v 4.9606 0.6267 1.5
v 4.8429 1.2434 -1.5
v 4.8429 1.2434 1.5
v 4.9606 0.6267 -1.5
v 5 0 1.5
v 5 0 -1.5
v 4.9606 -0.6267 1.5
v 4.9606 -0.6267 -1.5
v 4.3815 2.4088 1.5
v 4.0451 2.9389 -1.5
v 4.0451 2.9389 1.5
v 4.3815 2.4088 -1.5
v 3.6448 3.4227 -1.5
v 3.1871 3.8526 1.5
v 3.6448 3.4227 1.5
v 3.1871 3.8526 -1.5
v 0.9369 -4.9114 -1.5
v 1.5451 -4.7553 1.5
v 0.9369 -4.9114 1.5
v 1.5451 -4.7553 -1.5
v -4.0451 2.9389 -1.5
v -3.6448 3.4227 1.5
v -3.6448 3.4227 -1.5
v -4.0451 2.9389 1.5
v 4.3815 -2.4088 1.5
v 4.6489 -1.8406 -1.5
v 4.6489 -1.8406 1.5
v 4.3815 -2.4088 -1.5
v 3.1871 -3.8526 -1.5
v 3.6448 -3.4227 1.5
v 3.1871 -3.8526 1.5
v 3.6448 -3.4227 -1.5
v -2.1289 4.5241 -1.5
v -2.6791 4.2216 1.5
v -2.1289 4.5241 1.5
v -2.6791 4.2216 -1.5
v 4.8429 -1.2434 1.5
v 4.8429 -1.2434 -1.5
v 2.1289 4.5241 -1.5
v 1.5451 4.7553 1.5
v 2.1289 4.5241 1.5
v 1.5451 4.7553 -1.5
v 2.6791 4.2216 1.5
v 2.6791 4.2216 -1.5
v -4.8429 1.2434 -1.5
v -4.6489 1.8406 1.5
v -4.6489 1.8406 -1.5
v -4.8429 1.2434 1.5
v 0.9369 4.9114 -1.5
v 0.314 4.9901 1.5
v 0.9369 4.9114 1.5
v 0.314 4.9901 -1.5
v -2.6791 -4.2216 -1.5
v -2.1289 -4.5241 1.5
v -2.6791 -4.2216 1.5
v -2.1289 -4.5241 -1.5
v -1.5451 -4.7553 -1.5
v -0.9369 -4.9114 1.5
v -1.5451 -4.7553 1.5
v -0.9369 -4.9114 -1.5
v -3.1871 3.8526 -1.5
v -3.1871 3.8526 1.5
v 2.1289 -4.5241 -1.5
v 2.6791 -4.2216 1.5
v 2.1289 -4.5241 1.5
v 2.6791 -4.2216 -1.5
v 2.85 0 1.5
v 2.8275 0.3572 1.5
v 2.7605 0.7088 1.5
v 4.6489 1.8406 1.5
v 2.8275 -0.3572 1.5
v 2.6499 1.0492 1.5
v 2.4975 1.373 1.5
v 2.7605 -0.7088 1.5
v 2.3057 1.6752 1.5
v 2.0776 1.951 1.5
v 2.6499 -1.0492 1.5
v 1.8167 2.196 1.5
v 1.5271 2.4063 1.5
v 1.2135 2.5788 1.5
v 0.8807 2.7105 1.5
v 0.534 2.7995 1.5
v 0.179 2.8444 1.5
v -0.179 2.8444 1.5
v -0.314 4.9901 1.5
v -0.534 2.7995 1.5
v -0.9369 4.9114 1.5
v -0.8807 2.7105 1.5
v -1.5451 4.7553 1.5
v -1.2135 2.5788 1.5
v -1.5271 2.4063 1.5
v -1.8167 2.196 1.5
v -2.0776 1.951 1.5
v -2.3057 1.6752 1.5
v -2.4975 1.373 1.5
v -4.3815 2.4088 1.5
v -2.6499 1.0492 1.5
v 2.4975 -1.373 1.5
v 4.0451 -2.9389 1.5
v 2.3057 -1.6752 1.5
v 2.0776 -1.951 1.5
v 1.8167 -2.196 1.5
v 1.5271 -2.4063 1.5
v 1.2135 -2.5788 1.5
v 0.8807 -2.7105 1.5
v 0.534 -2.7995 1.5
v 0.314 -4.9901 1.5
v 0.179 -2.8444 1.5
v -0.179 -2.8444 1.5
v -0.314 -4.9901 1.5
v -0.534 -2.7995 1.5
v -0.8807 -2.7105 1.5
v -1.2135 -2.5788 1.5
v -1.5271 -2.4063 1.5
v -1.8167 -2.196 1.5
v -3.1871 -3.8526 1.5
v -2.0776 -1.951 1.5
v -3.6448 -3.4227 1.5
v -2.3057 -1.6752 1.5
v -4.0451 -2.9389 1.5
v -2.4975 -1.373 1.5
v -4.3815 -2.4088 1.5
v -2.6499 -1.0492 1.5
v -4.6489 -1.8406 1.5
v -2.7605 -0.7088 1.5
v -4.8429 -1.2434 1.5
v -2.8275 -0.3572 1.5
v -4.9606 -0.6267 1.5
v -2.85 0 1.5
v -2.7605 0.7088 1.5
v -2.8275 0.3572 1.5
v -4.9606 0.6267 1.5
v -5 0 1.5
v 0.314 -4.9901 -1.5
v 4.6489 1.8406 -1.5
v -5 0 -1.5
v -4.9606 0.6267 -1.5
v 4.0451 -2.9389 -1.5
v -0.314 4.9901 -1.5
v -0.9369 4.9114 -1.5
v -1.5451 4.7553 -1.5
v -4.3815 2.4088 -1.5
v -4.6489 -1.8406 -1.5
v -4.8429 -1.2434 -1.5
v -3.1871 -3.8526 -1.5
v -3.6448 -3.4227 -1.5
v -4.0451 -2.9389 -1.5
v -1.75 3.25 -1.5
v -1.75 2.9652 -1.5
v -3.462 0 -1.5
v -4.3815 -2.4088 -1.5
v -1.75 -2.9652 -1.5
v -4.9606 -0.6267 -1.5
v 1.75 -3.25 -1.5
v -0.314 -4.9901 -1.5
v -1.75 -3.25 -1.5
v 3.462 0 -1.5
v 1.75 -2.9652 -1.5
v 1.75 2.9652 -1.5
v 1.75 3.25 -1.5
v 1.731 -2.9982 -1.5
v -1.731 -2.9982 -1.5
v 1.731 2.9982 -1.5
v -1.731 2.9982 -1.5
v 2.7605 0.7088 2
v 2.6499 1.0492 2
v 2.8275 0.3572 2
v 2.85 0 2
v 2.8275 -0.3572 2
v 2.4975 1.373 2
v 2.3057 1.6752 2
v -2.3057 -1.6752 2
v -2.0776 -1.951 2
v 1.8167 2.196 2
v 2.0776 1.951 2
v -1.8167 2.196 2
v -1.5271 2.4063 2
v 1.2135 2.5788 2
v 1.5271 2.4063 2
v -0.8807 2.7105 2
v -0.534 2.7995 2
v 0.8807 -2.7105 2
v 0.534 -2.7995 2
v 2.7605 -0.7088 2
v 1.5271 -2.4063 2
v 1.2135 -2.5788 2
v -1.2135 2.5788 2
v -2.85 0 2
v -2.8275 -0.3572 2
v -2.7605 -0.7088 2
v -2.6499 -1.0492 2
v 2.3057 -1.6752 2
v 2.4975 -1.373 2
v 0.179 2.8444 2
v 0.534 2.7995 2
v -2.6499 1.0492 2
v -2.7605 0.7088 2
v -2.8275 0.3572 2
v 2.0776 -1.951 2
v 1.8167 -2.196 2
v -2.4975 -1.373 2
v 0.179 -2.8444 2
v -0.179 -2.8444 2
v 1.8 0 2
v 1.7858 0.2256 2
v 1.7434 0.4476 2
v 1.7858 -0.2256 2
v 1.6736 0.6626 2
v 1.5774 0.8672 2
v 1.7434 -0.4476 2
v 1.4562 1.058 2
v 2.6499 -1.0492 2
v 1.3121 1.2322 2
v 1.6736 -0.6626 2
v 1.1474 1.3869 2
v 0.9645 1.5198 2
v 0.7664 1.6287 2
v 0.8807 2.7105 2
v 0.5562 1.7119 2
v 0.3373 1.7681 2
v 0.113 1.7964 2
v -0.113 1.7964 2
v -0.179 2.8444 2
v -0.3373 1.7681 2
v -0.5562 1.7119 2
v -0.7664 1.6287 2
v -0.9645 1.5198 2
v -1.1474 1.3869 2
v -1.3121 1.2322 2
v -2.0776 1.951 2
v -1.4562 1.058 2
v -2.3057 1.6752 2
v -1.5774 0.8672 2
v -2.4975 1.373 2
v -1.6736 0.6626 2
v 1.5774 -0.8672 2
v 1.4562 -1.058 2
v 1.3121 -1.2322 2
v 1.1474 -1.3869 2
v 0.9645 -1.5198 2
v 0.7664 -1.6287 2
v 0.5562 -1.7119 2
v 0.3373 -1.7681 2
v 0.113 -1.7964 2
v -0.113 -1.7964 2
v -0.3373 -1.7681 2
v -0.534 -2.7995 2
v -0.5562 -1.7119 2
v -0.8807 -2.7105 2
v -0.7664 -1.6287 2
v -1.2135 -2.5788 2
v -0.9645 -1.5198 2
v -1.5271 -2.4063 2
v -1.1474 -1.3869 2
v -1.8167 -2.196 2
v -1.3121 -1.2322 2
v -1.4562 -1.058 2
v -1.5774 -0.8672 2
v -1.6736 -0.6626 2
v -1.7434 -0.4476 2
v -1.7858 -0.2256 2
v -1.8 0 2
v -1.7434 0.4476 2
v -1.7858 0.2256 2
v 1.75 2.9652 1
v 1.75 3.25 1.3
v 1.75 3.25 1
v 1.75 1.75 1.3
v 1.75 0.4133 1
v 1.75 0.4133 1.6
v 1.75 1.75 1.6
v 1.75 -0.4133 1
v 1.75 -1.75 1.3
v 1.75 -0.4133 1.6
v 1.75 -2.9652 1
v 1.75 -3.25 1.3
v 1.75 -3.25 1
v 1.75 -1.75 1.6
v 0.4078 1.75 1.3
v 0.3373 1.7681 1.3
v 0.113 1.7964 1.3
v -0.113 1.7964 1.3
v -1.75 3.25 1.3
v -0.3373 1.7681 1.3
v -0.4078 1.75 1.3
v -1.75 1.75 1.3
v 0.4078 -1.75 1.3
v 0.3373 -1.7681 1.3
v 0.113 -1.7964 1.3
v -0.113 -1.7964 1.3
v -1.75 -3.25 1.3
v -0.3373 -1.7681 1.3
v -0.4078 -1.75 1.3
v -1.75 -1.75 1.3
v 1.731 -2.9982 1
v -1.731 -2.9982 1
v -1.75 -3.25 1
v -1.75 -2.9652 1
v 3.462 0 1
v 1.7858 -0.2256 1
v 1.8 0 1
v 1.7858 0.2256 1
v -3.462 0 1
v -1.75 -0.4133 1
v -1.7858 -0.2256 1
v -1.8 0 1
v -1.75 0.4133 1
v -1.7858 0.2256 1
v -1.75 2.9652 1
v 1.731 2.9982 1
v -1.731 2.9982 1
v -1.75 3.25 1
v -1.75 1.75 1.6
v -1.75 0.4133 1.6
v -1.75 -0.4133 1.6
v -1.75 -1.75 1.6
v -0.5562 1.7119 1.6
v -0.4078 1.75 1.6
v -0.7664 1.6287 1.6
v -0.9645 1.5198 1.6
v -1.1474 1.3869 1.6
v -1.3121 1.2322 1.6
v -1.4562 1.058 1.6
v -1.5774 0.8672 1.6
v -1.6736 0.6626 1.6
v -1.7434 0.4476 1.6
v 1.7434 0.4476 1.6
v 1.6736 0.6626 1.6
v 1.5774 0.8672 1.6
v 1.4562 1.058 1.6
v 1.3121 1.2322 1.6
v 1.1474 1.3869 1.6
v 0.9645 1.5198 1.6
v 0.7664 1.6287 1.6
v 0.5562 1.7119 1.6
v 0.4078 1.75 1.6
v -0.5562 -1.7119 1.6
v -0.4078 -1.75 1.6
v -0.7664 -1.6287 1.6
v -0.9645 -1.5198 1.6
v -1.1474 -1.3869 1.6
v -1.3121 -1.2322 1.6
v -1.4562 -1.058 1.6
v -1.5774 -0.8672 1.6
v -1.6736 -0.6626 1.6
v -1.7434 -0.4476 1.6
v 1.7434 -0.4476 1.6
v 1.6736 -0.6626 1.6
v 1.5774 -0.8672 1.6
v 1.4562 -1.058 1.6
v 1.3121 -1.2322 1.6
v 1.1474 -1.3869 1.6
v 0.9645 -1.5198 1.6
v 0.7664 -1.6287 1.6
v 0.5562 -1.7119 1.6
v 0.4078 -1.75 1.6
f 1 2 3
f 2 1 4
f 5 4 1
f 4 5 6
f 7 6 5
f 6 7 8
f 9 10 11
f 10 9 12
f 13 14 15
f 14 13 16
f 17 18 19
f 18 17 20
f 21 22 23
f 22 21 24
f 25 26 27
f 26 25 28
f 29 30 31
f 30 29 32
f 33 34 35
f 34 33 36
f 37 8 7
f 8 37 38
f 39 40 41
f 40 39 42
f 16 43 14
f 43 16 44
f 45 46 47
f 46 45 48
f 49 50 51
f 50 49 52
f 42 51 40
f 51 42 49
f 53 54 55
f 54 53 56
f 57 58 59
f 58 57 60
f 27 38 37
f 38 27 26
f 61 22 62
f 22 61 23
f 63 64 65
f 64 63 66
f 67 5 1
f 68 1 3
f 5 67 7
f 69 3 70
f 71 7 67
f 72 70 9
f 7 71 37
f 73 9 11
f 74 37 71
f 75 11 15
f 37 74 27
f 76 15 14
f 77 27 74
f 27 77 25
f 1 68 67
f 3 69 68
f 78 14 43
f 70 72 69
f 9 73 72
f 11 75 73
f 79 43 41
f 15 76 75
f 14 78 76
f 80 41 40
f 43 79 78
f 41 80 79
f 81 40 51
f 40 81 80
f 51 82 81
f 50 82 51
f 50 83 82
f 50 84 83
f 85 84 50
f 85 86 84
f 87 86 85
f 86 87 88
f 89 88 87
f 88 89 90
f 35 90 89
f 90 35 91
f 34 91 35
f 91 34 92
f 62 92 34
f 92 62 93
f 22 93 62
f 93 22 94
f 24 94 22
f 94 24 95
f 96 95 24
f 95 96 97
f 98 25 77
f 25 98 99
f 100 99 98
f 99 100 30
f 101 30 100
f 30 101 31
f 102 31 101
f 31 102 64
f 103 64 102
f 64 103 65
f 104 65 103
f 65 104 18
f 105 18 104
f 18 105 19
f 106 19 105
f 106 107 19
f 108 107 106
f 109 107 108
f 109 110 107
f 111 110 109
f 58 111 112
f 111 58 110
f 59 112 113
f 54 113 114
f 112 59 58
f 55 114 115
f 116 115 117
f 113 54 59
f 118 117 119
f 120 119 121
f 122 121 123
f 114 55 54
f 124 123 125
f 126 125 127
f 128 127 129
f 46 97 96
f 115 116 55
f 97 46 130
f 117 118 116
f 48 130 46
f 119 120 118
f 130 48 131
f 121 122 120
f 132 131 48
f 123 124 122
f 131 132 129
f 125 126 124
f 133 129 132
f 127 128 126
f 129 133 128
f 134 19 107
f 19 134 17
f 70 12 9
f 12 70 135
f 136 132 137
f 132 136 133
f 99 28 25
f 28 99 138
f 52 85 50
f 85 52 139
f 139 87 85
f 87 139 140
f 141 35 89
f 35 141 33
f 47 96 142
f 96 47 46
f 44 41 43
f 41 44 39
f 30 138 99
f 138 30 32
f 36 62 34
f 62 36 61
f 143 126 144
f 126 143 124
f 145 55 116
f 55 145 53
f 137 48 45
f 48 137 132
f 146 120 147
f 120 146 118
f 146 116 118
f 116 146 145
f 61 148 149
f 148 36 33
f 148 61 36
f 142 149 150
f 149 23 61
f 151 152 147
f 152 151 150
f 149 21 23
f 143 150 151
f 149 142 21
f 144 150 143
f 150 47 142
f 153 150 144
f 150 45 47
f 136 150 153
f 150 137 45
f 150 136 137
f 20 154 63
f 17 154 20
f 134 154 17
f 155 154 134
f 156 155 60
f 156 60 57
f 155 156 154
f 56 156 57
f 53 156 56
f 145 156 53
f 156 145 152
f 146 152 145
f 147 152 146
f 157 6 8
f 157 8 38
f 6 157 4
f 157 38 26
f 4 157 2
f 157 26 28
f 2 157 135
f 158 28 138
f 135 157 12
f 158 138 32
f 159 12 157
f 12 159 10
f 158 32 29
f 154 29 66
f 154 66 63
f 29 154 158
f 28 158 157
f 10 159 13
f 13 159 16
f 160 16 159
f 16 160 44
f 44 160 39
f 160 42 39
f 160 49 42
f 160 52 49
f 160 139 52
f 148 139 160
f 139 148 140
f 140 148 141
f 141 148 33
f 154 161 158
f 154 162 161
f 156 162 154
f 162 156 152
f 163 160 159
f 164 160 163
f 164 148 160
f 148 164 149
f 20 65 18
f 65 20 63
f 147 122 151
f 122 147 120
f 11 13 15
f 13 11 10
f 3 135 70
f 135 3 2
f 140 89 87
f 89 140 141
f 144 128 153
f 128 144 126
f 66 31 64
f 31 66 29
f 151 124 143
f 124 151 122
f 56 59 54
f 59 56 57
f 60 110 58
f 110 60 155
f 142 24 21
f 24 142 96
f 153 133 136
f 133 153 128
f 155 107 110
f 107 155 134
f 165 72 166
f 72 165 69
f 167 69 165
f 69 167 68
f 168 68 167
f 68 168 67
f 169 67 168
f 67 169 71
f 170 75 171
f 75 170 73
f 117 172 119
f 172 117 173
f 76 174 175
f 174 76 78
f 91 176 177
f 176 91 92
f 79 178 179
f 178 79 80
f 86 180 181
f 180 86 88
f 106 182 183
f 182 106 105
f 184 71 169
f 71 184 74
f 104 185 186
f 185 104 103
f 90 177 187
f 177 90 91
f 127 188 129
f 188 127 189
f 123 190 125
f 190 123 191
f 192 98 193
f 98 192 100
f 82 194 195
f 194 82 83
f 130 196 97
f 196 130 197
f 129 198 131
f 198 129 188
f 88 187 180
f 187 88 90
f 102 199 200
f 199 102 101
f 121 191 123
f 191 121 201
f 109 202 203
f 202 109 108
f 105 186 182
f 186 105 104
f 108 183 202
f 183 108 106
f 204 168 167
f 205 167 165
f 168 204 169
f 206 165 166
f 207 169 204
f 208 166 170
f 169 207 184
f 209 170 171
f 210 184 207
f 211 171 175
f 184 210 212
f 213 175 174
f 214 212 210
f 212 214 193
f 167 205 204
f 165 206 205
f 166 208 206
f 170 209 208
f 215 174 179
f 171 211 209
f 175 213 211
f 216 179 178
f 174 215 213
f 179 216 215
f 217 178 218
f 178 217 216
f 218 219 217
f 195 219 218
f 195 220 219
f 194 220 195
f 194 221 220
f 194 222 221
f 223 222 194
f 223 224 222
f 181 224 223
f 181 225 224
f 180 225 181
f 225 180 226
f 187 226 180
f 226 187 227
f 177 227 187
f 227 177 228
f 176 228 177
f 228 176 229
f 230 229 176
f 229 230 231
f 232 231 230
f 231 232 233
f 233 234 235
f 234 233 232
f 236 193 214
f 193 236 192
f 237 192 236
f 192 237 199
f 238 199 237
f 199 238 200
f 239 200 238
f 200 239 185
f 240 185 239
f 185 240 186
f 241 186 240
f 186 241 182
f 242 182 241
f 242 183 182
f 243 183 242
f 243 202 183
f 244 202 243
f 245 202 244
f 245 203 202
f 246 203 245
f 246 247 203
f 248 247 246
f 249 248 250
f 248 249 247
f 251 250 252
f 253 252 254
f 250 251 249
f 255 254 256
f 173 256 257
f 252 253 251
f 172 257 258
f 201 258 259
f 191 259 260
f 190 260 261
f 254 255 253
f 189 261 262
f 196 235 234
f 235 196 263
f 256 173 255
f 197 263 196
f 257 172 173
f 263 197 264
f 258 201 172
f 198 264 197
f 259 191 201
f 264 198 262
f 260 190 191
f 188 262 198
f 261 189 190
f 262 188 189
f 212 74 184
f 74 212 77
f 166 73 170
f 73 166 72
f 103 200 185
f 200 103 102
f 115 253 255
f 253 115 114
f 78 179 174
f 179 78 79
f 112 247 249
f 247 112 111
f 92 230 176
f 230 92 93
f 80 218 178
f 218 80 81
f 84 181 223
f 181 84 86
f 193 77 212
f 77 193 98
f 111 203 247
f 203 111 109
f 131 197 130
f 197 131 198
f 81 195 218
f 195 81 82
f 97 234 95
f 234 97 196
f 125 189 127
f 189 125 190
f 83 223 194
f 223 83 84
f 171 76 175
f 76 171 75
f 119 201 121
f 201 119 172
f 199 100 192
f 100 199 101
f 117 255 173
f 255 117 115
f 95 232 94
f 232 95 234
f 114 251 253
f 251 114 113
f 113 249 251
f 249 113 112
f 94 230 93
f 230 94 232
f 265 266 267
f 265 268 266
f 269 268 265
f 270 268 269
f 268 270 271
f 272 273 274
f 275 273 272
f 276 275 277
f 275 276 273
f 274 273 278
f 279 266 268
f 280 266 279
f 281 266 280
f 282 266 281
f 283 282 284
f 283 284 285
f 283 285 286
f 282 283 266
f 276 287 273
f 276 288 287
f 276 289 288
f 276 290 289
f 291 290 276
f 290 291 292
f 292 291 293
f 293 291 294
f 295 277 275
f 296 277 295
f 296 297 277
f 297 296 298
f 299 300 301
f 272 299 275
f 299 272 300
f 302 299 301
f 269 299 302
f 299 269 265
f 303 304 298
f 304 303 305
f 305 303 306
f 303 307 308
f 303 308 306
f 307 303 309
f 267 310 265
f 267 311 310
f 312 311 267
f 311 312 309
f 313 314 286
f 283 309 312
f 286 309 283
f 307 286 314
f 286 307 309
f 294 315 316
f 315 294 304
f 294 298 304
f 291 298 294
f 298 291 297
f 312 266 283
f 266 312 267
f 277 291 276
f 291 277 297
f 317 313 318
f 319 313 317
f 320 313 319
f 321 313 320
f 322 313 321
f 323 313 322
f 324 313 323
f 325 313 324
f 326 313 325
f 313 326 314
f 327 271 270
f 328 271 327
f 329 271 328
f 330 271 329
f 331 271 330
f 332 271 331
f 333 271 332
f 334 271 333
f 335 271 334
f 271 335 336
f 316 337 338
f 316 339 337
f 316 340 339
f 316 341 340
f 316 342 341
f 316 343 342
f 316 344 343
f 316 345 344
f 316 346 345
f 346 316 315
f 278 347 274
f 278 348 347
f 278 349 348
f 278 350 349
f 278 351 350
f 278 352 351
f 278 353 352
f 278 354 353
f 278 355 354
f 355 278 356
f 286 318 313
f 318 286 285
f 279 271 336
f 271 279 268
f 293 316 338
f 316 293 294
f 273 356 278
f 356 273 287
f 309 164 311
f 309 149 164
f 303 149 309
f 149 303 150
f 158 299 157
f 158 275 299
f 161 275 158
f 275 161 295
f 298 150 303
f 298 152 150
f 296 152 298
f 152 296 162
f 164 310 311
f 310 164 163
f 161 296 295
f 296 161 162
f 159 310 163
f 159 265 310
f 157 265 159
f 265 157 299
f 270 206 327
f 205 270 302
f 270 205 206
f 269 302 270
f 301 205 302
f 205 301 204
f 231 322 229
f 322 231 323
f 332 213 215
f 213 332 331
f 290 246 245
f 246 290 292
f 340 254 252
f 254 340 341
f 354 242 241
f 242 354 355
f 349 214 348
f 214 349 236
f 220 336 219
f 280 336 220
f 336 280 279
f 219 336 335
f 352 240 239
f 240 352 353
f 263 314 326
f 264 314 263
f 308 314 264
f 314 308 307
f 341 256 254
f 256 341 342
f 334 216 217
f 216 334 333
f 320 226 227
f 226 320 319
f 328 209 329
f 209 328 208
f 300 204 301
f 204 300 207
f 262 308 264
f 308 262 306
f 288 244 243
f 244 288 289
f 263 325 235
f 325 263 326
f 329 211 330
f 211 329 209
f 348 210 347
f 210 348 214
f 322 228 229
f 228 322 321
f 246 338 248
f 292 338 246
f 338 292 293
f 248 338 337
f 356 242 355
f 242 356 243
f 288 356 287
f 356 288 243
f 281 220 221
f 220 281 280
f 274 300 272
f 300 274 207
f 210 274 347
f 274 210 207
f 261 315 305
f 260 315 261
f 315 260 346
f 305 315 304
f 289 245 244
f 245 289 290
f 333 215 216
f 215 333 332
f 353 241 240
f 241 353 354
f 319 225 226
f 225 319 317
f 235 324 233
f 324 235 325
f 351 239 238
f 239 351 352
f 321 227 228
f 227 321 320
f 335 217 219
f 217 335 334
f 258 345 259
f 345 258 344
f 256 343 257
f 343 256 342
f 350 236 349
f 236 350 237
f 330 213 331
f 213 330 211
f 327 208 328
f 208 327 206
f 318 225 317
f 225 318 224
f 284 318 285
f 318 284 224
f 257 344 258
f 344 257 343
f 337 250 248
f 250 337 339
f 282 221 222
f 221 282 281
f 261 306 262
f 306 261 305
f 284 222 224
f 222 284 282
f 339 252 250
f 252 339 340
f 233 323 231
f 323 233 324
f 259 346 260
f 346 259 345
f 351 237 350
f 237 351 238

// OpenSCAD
$fn = 50;


difference() {
	union() {
		translate(v = [0, 0, -1.5000000000]) {
			cylinder(h = 3, r = 5.0000000000);
		}
		translate(v = [0, 0, -1.5000000000]) {
			cylinder(h = 3.5000000000, r = 2.8500000000);
		}
	}
	union() {
		translate(v = [0, 0, -1.5000000000]) {
			rotate(a = [0, 0, 0]) {
				difference() {
					union() {
						translate(v = [-1.7500000000, -3.2500000000, -0.3000000000]) {
							cube(size = [3.5000000000, 6.5000000000, 0.3000000000]);
						}
						translate(v = [-1.7500000000, -1.7500000000, -0.6000000000]) {
							cube(size = [3.5000000000, 3.5000000000, 0.3000000000]);
						}
						translate(v = [-1.7500000000, -3.2500000000, 2.5000000000]) {
							cube(size = [3.5000000000, 6.5000000000, 0.3000000000]);
						}
						translate(v = [-1.7500000000, -1.7500000000, 2.8000000000]) {
							cube(size = [3.5000000000, 3.5000000000, 0.3000000000]);
						}
						linear_extrude(height = 2.5000000000) {
							polygon(points = [[3.4620000000, 0.0000000000], [1.7310000000, 2.9981799479], [-1.7310000000, 2.9981799479], [-3.4620000000, 0.0000000000], [-1.7310000000, -2.9981799479], [1.7310000000, -2.9981799479]]);
						}
						translate(v = [-1.7500000000, -3.2500000000, -0.3000000000]) {
							cube(size = [3.5000000000, 6.5000000000, 0.3000000000]);
						}
						translate(v = [-1.7500000000, -1.7500000000, -0.6000000000]) {
							cube(size = [3.5000000000, 3.5000000000, 0.3000000000]);
						}
						translate(v = [-1.7500000000, -3.2500000000, 2.5000000000]) {
							cube(size = [3.5000000000, 6.5000000000, 0.3000000000]);
						}
						translate(v = [-1.7500000000, -1.7500000000, 2.8000000000]) {
							cube(size = [3.5000000000, 3.5000000000, 0.3000000000]);
						}
						translate(v = [-1.7500000000, -3.2500000000, -0.3000000000]) {
							cube(size = [3.5000000000, 6.5000000000, 0.3000000000]);
						}
						translate(v = [-1.7500000000, -1.7500000000, -0.6000000000]) {
							cube(size = [3.5000000000, 3.5000000000, 0.3000000000]);
						}
						translate(v = [-1.7500000000, -3.2500000000, 2.5000000000]) {
							cube(size = [3.5000000000, 6.5000000000, 0.3000000000]);
						}
						translate(v = [-1.7500000000, -1.7500000000, 2.8000000000]) {
							cube(size = [3.5000000000, 3.5000000000, 0.3000000000]);
						}
					}
					union();
				}
			}
		}
		translate(v = [0, 0, -100.0000000000]) {
			cylinder(h = 200, r = 1.8000000000);
		}
	}
}
